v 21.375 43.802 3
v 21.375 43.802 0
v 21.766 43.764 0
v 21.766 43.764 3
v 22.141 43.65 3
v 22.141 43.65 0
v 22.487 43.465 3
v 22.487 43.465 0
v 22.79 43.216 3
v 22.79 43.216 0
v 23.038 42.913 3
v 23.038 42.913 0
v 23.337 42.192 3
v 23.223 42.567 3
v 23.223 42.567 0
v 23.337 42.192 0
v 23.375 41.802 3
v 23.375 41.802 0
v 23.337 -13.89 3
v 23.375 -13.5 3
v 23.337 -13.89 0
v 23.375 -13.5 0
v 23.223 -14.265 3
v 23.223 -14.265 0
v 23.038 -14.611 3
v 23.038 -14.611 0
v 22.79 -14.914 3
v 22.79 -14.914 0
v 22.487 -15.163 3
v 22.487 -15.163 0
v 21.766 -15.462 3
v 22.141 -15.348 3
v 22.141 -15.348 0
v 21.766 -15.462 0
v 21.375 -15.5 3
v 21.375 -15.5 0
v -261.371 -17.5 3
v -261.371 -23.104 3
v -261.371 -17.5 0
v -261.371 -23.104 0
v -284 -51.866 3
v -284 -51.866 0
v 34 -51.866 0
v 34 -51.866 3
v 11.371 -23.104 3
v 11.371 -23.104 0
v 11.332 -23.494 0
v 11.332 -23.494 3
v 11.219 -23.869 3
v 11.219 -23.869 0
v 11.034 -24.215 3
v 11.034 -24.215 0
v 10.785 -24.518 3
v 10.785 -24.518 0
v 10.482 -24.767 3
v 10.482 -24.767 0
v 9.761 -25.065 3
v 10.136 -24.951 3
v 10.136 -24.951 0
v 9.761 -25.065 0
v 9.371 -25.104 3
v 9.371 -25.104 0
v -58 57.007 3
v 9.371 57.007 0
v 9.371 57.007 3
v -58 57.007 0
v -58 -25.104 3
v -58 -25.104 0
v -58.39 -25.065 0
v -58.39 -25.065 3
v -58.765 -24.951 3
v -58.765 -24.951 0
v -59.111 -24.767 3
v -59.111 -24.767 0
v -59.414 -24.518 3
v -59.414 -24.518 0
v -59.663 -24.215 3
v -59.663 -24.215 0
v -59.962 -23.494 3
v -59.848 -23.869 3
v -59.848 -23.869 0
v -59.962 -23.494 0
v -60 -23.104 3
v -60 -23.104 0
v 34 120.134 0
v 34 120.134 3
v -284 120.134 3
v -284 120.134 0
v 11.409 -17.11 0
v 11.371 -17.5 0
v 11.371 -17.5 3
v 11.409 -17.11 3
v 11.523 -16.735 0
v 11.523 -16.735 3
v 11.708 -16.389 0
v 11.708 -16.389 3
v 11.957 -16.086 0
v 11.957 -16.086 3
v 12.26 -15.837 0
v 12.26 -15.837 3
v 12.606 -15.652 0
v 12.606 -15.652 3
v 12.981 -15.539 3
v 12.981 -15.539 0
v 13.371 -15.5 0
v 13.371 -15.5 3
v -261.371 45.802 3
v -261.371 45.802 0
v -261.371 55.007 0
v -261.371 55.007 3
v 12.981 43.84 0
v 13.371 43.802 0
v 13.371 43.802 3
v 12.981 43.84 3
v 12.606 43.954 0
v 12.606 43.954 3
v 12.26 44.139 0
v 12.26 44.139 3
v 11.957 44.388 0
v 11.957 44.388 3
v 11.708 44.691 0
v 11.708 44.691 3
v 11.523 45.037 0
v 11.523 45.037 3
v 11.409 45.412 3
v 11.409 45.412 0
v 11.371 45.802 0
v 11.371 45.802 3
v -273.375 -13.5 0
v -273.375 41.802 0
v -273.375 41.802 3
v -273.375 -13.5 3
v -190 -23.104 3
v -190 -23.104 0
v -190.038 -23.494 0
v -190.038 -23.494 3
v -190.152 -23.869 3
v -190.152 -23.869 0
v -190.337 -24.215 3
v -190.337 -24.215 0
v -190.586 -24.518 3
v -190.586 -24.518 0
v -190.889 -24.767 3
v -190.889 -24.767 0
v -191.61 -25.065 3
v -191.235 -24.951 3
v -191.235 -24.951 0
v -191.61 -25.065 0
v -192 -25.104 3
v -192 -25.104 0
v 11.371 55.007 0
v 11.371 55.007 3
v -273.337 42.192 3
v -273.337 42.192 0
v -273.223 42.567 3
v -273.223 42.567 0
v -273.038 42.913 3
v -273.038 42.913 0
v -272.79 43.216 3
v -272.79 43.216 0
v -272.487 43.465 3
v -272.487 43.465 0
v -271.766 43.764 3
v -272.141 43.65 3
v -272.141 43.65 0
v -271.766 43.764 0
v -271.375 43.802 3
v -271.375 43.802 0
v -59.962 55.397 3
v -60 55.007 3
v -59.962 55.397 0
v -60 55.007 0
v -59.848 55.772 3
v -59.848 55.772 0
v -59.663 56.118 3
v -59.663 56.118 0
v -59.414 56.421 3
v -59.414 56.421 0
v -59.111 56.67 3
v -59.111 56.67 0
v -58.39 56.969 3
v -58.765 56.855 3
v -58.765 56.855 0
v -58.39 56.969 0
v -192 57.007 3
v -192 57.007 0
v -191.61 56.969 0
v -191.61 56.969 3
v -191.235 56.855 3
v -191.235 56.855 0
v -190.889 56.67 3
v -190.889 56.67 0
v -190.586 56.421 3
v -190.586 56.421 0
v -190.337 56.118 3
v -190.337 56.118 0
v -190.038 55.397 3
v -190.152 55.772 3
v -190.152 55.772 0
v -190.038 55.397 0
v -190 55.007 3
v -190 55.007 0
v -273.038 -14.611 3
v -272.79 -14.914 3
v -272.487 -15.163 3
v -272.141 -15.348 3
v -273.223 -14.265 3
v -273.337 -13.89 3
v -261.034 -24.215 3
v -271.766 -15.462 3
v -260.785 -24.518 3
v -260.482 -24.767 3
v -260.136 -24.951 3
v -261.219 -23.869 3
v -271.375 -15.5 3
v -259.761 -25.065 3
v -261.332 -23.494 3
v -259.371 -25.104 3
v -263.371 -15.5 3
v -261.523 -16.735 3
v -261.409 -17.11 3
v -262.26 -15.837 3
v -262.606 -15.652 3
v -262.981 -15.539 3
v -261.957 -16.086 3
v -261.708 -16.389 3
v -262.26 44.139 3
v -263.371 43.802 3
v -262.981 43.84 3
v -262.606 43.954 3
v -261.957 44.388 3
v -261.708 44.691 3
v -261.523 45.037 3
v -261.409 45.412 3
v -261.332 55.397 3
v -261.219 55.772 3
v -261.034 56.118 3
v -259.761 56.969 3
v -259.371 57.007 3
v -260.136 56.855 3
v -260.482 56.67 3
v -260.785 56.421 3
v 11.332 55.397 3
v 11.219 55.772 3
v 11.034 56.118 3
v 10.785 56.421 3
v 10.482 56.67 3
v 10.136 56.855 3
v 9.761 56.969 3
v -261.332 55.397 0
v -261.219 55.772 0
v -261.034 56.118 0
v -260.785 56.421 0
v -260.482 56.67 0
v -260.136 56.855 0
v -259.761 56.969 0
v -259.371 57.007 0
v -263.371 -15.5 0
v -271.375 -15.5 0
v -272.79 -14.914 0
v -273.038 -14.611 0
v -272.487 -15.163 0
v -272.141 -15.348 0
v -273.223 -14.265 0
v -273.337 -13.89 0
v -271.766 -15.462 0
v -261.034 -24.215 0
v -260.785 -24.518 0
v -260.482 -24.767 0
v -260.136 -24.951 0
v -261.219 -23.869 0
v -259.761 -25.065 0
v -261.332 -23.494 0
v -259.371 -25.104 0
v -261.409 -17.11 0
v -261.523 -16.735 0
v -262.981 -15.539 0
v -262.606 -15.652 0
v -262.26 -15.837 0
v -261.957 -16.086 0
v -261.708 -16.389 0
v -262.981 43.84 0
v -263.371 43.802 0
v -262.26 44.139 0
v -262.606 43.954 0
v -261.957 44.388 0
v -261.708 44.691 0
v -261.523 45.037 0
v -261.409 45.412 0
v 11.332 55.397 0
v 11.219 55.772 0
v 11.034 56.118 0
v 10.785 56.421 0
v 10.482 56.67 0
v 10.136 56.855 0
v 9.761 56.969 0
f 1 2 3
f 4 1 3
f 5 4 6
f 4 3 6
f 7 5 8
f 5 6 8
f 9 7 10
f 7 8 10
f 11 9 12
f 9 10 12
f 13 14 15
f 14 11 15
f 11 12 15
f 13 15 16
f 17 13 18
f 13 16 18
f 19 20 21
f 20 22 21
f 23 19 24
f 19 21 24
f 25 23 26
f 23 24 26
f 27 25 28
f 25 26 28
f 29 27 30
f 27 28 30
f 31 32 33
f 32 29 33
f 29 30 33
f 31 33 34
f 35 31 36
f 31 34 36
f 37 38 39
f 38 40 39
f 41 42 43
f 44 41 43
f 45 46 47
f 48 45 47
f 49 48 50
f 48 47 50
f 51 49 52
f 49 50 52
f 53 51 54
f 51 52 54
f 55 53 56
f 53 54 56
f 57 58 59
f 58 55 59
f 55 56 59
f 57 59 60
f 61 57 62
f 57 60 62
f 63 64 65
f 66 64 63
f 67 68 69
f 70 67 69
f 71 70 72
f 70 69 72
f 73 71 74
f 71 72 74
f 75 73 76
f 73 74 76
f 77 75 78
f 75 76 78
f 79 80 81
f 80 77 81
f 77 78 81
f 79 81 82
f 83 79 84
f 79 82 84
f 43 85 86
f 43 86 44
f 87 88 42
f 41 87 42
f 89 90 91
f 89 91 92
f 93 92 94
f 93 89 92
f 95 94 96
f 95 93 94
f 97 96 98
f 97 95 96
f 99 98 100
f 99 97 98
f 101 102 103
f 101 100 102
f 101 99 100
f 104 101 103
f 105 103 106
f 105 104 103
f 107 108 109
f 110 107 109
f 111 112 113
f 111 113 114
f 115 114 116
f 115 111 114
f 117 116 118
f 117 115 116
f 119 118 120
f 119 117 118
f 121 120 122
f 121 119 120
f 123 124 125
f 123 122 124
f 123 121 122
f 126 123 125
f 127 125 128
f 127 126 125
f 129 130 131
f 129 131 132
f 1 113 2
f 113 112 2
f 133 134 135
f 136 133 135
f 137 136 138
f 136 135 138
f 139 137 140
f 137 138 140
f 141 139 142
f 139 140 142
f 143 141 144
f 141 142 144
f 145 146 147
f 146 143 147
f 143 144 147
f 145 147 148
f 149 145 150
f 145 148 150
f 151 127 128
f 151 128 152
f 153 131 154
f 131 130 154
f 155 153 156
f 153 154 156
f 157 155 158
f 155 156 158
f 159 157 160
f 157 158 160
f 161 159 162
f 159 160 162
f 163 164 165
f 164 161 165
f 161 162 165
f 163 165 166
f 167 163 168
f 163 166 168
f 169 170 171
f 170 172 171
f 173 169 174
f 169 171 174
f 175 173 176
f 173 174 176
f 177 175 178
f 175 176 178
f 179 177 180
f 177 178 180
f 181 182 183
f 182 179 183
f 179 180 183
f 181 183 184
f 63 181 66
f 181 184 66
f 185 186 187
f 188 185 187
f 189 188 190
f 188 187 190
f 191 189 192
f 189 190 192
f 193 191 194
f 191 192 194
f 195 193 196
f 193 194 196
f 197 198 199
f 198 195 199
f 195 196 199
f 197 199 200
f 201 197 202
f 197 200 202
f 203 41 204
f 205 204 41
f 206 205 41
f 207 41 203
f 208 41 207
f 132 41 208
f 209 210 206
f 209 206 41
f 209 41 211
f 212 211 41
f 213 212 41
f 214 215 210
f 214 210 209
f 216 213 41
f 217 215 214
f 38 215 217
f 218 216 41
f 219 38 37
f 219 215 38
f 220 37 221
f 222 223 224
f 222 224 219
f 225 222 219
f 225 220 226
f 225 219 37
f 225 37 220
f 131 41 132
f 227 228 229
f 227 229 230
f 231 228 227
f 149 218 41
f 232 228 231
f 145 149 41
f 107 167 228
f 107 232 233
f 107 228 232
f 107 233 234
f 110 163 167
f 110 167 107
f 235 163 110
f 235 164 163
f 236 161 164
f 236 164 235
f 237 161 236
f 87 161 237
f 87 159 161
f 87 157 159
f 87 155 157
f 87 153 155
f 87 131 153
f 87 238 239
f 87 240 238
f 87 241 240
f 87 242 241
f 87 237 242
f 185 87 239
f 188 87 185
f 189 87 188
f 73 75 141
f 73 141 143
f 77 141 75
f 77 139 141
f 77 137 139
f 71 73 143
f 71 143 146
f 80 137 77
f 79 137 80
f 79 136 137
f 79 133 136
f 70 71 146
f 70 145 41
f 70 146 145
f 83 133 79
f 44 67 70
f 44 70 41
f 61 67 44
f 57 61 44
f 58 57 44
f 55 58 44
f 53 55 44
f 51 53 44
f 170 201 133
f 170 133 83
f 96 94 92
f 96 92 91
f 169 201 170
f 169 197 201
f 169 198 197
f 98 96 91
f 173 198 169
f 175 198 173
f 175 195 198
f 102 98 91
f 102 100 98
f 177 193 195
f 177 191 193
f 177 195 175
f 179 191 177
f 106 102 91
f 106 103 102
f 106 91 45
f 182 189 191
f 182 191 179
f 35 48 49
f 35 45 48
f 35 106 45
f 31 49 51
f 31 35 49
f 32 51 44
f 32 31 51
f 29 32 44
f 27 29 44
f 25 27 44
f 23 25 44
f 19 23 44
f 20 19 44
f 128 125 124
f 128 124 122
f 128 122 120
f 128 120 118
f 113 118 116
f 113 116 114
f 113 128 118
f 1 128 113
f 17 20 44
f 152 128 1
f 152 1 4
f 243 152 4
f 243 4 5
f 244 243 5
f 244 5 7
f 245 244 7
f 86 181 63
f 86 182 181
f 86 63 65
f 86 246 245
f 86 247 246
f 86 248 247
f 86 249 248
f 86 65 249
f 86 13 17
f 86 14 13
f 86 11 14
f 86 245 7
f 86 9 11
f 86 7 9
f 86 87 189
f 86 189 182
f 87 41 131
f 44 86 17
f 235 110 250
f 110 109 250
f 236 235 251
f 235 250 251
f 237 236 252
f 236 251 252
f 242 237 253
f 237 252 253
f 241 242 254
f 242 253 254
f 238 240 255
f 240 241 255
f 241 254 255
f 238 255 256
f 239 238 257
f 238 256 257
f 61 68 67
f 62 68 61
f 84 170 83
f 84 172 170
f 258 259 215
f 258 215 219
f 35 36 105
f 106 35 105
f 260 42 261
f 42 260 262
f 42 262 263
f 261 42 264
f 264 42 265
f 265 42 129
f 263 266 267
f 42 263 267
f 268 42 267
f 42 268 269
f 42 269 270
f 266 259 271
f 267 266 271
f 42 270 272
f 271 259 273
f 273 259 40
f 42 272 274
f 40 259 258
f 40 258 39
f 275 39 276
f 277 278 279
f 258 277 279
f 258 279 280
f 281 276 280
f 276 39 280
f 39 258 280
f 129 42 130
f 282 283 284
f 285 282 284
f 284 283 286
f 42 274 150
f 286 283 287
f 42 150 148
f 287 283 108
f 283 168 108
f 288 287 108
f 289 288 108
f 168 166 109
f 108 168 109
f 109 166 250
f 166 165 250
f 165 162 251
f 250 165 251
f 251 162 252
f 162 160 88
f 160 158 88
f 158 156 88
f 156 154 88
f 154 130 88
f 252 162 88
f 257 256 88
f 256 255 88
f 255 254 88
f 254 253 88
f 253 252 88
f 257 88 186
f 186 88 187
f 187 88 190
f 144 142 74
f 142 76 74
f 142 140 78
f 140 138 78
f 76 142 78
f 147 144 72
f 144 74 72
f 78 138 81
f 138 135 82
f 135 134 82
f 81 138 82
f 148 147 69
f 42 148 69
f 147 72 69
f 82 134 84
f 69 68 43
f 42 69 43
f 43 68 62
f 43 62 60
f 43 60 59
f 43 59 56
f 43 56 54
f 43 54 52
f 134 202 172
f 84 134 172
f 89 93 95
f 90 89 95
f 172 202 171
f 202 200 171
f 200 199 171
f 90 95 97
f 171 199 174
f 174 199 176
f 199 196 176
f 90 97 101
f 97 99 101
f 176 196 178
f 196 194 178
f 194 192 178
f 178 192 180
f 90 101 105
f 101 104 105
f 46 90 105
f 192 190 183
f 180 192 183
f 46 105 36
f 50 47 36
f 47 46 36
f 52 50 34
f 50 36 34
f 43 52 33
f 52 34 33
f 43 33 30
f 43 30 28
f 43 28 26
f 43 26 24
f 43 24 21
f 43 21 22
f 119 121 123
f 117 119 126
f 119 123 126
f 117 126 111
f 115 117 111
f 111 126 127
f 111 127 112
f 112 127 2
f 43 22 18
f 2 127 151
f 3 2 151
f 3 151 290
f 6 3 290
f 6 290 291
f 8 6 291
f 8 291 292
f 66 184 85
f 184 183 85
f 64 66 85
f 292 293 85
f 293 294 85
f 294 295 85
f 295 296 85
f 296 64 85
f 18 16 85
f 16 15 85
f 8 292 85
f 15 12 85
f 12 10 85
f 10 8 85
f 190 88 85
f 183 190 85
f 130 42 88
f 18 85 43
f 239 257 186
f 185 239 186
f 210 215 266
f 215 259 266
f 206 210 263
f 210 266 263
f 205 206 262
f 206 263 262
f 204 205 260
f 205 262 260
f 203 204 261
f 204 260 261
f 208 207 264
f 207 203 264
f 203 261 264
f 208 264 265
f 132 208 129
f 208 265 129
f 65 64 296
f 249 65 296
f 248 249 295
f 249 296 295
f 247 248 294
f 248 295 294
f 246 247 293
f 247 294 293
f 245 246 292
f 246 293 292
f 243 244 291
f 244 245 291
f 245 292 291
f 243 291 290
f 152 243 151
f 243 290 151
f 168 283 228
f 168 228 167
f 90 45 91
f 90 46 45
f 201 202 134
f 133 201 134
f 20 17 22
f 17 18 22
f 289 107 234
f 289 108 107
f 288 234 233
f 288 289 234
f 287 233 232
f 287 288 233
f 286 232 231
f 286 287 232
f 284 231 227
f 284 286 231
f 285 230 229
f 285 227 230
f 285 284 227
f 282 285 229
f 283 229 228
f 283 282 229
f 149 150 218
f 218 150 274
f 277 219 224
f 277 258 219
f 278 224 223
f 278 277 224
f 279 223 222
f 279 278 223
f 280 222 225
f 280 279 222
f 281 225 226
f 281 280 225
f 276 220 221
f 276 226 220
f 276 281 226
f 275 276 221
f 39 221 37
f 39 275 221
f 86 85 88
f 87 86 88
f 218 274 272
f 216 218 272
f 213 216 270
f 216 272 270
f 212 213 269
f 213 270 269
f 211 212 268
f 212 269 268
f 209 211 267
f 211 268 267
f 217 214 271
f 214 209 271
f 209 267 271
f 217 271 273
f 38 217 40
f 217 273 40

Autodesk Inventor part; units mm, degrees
ref_plane "YZ Plane" through (0, 0, 0) normal (1, 0, 0) x (0, 1, 0)
ref_plane "XZ Plane" through (0, 0, 0) normal (0, 1, 0) x (-1, 0, 0)
ref_plane "XY Plane" through (0, 0, 0) normal (0, 0, 1) x (1, 0, 0)
ref_plane "Plan de construction1" through (0, 0, 0) normal (0, 0, 1) x (1, 0, 0)
sketch "Esquisse1" plane through (0, 0, 0) normal (0, 0, 1) x (1, 0, 0)
  line L0 (-259.3709, 57.007) -> (-192, 57.007)
  line L1 (-190, 55.007) -> (-190, -23.1037)
  line L2 (-192, -25.1037) -> (-259.3709, -25.1037)
  line L3 (-263.3709, 43.802) -> (-271.3754, 43.802)
  line L4 (-273.3754, 41.802) -> (-273.3754, -13.5001)
  line L5 (-271.3754, -15.5001) -> (-263.3709, -15.5001)
  line L6 (-261.3709, -23.1037) -> (-261.3709, -17.5001)
  line L7 (-261.3709, 45.802) -> (-261.3709, 55.007)
  arc A0 (-263.3709, 43.802) -> (-261.3709, 45.802) centre (-263.3709, 45.802) ccw
  arc A1 (-190, 55.007) -> (-192, 57.007) centre (-192, 55.007) ccw
  arc A2 (-192, -25.1037) -> (-190, -23.1037) centre (-192, -23.1037) ccw
  arc A3 (-261.3709, -17.5001) -> (-263.3709, -15.5001) centre (-263.3709, -17.5001) ccw
  arc A4 (-261.3709, -23.1037) -> (-259.3709, -25.1037) centre (-259.3709, -23.1037) ccw
  arc A5 (-273.3754, -13.5001) -> (-271.3754, -15.5001) centre (-271.3754, -13.5001) ccw
  arc A6 (-271.3754, 43.802) -> (-273.3754, 41.802) centre (-271.3754, 41.802) ccw
  arc A7 (-259.3709, 57.007) -> (-261.3709, 55.007) centre (-259.3709, 55.007) ccw
  line L8 (-190, 25.8053) -> (-162, 25.8053) projected
  line L9 (-125, 120.1339) -> (-125, -94.4398)
  line L10 (-280, 60.1339) -> (30, 60.1339) projected
  line L11 (30, 60.1339) -> (30, -31.8661) projected
  line L12 (9.3709, 57.007) -> (-58, 57.007)
  line L13 (-60, 55.007) -> (-60, -23.1037)
  line L14 (-58, -25.1037) -> (9.3709, -25.1037)
  line L15 (13.3709, 43.802) -> (21.3754, 43.802)
  line L16 (23.3754, 41.802) -> (23.3754, -13.5001)
  line L17 (21.3754, -15.5001) -> (13.3709, -15.5001)
  line L18 (11.3709, -23.1037) -> (11.3709, -17.5001)
  line L19 (11.3709, 45.802) -> (11.3709, 55.007)
  arc A8 (11.3709, 45.802) -> (13.3709, 43.802) centre (13.3709, 45.802) ccw
  arc A9 (-58, 57.007) -> (-60, 55.007) centre (-58, 55.007) ccw
  arc A10 (-60, -23.1037) -> (-58, -25.1037) centre (-58, -23.1037) ccw
  arc A11 (13.3709, -15.5001) -> (11.3709, -17.5001) centre (13.3709, -17.5001) ccw
  arc A12 (9.3709, -25.1037) -> (11.3709, -23.1037) centre (9.3709, -23.1037) ccw
  arc A13 (21.3754, -15.5001) -> (23.3754, -13.5001) centre (21.3754, -13.5001) ccw
  arc A14 (23.3754, 41.802) -> (21.3754, 43.802) centre (21.3754, 41.802) ccw
  arc A15 (11.3709, 55.007) -> (9.3709, 57.007) centre (9.3709, 55.007) ccw
  line L20 (-125, 120.1339) -> (-284, 120.1339)
  line L21 (-284, 120.1339) -> (-284, -51.8661)
  line L22 (-284, -51.8661) -> (-125, -51.8661)
  line L23 (-125, -51.8661) -> (-125, 120.1339)
  line L24 (-280, -31.8661) -> (-280, 60.1339) projected
  line L25 (-323.0211, 14.1339) -> (69.534, 14.1339)
  line L26 (-125, 120.1339) -> (34, 120.1339)
  line L27 (34, 120.1339) -> (34, -51.8661)
  line L28 (34, -51.8661) -> (-125, -51.8661)
  point P0 (0, 0)
  dimension "d0" = 2
  dimension "d1" = 155
  dimension "d4" = 4
  dimension "d5" = 172
  dimension "d10" = 20
extrude "Extrusion1" add sketch "Esquisse1" along normal blind 3 contours A7 L7 A0 L3 A6 L4 L25 L24 L10 L9 L1 A1 L0 | L25 L9 L22 L21 L4 A5 L5 A3 L6 A4 L2 A2 L1 | L25 L13 A10 L14 A12 L18 A11 L17 A13 L16 L27 L28 L9 | L9 L10 L11 L25 L16 A14 L15 A8 L19 A15 L12 A9 L13 | L25 L21 L20 L9 L10 L24 | L9 L26 L27 L25 L11 L10
properties part number "base robot"
